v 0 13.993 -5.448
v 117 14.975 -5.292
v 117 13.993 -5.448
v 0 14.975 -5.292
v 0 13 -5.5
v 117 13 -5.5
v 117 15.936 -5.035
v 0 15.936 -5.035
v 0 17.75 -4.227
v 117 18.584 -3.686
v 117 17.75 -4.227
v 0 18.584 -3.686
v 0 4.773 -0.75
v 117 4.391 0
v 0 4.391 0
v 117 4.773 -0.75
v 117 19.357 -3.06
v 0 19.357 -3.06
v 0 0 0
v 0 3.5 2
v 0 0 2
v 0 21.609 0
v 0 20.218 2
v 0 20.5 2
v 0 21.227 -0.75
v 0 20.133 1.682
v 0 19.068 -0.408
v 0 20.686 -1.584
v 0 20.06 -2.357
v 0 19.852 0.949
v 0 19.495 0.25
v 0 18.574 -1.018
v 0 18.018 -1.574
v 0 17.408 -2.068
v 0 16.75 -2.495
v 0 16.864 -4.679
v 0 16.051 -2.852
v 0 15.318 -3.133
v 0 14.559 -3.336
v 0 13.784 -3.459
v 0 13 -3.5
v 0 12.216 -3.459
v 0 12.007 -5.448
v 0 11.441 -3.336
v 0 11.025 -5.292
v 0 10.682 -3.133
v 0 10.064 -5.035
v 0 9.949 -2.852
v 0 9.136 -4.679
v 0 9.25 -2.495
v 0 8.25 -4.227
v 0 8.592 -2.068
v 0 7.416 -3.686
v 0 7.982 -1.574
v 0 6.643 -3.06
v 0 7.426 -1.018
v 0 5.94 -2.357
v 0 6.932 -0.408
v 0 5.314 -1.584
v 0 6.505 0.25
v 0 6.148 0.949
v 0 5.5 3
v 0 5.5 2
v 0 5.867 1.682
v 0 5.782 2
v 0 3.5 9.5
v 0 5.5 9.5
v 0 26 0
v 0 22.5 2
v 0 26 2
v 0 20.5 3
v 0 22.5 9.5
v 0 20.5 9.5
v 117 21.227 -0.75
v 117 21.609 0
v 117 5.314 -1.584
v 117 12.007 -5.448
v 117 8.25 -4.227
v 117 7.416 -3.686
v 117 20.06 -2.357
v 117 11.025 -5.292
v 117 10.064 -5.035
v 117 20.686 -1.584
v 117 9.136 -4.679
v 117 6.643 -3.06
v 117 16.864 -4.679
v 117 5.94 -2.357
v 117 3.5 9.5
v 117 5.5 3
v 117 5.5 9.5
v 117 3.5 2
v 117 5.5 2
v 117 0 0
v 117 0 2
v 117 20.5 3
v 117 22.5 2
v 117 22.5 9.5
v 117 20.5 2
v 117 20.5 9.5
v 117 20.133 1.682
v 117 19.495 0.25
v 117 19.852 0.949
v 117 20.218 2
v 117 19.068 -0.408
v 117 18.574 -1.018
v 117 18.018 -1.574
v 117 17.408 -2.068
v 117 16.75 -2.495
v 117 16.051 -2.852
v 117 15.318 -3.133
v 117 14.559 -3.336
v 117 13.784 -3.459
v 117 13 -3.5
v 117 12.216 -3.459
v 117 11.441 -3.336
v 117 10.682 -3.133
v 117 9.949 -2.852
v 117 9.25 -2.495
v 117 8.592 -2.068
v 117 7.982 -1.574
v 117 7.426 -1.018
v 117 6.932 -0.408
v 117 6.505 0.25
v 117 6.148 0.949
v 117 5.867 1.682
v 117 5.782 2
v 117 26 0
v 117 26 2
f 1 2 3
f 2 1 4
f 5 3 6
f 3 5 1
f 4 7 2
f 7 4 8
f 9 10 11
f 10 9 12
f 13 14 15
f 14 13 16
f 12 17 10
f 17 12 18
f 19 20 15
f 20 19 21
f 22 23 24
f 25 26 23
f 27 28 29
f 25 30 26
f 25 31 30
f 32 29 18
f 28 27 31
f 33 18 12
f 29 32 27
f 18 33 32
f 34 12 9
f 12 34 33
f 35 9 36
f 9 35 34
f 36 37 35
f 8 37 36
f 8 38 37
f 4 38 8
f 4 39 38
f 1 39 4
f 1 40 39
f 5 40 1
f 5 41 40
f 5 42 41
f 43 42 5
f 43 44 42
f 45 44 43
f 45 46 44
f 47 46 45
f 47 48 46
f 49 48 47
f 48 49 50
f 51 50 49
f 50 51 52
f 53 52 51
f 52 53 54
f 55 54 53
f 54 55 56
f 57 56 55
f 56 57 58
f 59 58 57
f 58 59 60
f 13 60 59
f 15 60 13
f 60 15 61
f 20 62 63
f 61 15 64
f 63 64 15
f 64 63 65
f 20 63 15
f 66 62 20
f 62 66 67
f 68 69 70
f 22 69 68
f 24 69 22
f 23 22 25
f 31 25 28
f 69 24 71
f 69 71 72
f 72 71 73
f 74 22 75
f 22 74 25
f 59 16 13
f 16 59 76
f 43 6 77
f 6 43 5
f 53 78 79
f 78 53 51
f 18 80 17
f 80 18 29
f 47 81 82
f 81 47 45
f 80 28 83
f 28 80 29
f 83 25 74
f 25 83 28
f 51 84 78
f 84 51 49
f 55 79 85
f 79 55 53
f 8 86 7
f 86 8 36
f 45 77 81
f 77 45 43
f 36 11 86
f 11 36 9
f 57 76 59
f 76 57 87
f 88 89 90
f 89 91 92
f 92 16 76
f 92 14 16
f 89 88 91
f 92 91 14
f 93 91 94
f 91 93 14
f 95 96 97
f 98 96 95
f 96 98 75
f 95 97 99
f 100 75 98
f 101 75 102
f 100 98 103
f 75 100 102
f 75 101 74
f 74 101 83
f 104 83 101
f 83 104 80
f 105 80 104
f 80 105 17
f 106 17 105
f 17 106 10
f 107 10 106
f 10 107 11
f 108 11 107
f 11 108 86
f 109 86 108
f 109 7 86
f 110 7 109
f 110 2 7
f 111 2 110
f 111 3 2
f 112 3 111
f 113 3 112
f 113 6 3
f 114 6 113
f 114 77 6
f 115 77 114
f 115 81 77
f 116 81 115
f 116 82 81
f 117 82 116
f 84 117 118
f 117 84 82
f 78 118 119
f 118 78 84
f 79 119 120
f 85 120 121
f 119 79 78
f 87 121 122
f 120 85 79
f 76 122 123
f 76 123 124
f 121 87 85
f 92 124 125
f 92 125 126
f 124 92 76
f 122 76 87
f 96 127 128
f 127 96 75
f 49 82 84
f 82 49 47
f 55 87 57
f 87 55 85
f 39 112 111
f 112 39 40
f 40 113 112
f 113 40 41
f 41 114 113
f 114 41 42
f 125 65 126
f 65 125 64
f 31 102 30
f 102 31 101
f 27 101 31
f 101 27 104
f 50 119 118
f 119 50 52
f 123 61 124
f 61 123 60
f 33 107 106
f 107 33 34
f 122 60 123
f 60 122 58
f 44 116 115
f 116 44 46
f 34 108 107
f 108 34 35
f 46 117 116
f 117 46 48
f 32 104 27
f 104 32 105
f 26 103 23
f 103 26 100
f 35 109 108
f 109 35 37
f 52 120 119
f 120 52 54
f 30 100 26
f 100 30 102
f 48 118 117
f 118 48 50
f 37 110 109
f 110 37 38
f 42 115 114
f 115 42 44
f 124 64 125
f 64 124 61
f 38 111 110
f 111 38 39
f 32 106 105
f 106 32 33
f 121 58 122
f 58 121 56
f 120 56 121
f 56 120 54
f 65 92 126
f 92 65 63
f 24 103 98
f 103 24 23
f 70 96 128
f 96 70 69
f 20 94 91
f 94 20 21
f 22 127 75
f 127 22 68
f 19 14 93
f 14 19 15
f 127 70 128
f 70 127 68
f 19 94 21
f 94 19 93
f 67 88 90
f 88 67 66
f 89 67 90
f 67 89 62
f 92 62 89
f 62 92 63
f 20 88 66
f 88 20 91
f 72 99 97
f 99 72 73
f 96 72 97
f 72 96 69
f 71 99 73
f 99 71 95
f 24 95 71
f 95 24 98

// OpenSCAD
// --- Dimensions ---
total_length = 117;   // 11.7cm from the vertical sketch
total_width = 26; //extended    // 2.4cm from the right sketch
inner_width = 15;     // 1.5cm from the top-left sketch
flange_height = 7.5;  // 7.5mm from the right sketch
bottom_thick = 2;   // 1.7mm from the bottom-right sketch

// Calculated dimensions
wall_thick = 2;// // Equals 4.5mm
distance_to_side=(total_width - inner_width-wall_thick*2) / 2;
echo(distance_to_side);
// --- Rendering Options ---
$fn = 60; // Smooth out curves

module uchannel()
 {

    // 1. The Bottom Base Plate
    cube([total_length, total_width, bottom_thick]);

    // 2. The Left Side Wall
    translate([0,distance_to_side , bottom_thick])
        cube([total_length, wall_thick, flange_height]);

    // 3. The Right Side Wall
    translate([0, total_width - distance_to_side-wall_thick, bottom_thick])
        cube([total_length, wall_thick, flange_height]);

}
module uchannel_without_mid(){
difference()
{
substract_w=inner_width-4;
uchannel();
translate([-1,(total_width-inner_width)/2,-1])
cube([total_length+2, inner_width, bottom_thick*2]);
}
}
offset_to_center=2;
module clip(){


intersection() {
    // Big cylinder - small cylinder
    difference() {
        cylinder(h = total_length, r = inner_width/2+bottom_thick);
        cylinder(h = total_length, r = inner_width/2);
    }

    // Keep only top half
    translate([offset_to_center, -25, -1])
        cube([52, 50, total_length+10]);
}

}
translate([0,total_width/2,bottom_thick+offset_to_center])
rotate([0,90,0])
clip();
uchannel_without_mid();
